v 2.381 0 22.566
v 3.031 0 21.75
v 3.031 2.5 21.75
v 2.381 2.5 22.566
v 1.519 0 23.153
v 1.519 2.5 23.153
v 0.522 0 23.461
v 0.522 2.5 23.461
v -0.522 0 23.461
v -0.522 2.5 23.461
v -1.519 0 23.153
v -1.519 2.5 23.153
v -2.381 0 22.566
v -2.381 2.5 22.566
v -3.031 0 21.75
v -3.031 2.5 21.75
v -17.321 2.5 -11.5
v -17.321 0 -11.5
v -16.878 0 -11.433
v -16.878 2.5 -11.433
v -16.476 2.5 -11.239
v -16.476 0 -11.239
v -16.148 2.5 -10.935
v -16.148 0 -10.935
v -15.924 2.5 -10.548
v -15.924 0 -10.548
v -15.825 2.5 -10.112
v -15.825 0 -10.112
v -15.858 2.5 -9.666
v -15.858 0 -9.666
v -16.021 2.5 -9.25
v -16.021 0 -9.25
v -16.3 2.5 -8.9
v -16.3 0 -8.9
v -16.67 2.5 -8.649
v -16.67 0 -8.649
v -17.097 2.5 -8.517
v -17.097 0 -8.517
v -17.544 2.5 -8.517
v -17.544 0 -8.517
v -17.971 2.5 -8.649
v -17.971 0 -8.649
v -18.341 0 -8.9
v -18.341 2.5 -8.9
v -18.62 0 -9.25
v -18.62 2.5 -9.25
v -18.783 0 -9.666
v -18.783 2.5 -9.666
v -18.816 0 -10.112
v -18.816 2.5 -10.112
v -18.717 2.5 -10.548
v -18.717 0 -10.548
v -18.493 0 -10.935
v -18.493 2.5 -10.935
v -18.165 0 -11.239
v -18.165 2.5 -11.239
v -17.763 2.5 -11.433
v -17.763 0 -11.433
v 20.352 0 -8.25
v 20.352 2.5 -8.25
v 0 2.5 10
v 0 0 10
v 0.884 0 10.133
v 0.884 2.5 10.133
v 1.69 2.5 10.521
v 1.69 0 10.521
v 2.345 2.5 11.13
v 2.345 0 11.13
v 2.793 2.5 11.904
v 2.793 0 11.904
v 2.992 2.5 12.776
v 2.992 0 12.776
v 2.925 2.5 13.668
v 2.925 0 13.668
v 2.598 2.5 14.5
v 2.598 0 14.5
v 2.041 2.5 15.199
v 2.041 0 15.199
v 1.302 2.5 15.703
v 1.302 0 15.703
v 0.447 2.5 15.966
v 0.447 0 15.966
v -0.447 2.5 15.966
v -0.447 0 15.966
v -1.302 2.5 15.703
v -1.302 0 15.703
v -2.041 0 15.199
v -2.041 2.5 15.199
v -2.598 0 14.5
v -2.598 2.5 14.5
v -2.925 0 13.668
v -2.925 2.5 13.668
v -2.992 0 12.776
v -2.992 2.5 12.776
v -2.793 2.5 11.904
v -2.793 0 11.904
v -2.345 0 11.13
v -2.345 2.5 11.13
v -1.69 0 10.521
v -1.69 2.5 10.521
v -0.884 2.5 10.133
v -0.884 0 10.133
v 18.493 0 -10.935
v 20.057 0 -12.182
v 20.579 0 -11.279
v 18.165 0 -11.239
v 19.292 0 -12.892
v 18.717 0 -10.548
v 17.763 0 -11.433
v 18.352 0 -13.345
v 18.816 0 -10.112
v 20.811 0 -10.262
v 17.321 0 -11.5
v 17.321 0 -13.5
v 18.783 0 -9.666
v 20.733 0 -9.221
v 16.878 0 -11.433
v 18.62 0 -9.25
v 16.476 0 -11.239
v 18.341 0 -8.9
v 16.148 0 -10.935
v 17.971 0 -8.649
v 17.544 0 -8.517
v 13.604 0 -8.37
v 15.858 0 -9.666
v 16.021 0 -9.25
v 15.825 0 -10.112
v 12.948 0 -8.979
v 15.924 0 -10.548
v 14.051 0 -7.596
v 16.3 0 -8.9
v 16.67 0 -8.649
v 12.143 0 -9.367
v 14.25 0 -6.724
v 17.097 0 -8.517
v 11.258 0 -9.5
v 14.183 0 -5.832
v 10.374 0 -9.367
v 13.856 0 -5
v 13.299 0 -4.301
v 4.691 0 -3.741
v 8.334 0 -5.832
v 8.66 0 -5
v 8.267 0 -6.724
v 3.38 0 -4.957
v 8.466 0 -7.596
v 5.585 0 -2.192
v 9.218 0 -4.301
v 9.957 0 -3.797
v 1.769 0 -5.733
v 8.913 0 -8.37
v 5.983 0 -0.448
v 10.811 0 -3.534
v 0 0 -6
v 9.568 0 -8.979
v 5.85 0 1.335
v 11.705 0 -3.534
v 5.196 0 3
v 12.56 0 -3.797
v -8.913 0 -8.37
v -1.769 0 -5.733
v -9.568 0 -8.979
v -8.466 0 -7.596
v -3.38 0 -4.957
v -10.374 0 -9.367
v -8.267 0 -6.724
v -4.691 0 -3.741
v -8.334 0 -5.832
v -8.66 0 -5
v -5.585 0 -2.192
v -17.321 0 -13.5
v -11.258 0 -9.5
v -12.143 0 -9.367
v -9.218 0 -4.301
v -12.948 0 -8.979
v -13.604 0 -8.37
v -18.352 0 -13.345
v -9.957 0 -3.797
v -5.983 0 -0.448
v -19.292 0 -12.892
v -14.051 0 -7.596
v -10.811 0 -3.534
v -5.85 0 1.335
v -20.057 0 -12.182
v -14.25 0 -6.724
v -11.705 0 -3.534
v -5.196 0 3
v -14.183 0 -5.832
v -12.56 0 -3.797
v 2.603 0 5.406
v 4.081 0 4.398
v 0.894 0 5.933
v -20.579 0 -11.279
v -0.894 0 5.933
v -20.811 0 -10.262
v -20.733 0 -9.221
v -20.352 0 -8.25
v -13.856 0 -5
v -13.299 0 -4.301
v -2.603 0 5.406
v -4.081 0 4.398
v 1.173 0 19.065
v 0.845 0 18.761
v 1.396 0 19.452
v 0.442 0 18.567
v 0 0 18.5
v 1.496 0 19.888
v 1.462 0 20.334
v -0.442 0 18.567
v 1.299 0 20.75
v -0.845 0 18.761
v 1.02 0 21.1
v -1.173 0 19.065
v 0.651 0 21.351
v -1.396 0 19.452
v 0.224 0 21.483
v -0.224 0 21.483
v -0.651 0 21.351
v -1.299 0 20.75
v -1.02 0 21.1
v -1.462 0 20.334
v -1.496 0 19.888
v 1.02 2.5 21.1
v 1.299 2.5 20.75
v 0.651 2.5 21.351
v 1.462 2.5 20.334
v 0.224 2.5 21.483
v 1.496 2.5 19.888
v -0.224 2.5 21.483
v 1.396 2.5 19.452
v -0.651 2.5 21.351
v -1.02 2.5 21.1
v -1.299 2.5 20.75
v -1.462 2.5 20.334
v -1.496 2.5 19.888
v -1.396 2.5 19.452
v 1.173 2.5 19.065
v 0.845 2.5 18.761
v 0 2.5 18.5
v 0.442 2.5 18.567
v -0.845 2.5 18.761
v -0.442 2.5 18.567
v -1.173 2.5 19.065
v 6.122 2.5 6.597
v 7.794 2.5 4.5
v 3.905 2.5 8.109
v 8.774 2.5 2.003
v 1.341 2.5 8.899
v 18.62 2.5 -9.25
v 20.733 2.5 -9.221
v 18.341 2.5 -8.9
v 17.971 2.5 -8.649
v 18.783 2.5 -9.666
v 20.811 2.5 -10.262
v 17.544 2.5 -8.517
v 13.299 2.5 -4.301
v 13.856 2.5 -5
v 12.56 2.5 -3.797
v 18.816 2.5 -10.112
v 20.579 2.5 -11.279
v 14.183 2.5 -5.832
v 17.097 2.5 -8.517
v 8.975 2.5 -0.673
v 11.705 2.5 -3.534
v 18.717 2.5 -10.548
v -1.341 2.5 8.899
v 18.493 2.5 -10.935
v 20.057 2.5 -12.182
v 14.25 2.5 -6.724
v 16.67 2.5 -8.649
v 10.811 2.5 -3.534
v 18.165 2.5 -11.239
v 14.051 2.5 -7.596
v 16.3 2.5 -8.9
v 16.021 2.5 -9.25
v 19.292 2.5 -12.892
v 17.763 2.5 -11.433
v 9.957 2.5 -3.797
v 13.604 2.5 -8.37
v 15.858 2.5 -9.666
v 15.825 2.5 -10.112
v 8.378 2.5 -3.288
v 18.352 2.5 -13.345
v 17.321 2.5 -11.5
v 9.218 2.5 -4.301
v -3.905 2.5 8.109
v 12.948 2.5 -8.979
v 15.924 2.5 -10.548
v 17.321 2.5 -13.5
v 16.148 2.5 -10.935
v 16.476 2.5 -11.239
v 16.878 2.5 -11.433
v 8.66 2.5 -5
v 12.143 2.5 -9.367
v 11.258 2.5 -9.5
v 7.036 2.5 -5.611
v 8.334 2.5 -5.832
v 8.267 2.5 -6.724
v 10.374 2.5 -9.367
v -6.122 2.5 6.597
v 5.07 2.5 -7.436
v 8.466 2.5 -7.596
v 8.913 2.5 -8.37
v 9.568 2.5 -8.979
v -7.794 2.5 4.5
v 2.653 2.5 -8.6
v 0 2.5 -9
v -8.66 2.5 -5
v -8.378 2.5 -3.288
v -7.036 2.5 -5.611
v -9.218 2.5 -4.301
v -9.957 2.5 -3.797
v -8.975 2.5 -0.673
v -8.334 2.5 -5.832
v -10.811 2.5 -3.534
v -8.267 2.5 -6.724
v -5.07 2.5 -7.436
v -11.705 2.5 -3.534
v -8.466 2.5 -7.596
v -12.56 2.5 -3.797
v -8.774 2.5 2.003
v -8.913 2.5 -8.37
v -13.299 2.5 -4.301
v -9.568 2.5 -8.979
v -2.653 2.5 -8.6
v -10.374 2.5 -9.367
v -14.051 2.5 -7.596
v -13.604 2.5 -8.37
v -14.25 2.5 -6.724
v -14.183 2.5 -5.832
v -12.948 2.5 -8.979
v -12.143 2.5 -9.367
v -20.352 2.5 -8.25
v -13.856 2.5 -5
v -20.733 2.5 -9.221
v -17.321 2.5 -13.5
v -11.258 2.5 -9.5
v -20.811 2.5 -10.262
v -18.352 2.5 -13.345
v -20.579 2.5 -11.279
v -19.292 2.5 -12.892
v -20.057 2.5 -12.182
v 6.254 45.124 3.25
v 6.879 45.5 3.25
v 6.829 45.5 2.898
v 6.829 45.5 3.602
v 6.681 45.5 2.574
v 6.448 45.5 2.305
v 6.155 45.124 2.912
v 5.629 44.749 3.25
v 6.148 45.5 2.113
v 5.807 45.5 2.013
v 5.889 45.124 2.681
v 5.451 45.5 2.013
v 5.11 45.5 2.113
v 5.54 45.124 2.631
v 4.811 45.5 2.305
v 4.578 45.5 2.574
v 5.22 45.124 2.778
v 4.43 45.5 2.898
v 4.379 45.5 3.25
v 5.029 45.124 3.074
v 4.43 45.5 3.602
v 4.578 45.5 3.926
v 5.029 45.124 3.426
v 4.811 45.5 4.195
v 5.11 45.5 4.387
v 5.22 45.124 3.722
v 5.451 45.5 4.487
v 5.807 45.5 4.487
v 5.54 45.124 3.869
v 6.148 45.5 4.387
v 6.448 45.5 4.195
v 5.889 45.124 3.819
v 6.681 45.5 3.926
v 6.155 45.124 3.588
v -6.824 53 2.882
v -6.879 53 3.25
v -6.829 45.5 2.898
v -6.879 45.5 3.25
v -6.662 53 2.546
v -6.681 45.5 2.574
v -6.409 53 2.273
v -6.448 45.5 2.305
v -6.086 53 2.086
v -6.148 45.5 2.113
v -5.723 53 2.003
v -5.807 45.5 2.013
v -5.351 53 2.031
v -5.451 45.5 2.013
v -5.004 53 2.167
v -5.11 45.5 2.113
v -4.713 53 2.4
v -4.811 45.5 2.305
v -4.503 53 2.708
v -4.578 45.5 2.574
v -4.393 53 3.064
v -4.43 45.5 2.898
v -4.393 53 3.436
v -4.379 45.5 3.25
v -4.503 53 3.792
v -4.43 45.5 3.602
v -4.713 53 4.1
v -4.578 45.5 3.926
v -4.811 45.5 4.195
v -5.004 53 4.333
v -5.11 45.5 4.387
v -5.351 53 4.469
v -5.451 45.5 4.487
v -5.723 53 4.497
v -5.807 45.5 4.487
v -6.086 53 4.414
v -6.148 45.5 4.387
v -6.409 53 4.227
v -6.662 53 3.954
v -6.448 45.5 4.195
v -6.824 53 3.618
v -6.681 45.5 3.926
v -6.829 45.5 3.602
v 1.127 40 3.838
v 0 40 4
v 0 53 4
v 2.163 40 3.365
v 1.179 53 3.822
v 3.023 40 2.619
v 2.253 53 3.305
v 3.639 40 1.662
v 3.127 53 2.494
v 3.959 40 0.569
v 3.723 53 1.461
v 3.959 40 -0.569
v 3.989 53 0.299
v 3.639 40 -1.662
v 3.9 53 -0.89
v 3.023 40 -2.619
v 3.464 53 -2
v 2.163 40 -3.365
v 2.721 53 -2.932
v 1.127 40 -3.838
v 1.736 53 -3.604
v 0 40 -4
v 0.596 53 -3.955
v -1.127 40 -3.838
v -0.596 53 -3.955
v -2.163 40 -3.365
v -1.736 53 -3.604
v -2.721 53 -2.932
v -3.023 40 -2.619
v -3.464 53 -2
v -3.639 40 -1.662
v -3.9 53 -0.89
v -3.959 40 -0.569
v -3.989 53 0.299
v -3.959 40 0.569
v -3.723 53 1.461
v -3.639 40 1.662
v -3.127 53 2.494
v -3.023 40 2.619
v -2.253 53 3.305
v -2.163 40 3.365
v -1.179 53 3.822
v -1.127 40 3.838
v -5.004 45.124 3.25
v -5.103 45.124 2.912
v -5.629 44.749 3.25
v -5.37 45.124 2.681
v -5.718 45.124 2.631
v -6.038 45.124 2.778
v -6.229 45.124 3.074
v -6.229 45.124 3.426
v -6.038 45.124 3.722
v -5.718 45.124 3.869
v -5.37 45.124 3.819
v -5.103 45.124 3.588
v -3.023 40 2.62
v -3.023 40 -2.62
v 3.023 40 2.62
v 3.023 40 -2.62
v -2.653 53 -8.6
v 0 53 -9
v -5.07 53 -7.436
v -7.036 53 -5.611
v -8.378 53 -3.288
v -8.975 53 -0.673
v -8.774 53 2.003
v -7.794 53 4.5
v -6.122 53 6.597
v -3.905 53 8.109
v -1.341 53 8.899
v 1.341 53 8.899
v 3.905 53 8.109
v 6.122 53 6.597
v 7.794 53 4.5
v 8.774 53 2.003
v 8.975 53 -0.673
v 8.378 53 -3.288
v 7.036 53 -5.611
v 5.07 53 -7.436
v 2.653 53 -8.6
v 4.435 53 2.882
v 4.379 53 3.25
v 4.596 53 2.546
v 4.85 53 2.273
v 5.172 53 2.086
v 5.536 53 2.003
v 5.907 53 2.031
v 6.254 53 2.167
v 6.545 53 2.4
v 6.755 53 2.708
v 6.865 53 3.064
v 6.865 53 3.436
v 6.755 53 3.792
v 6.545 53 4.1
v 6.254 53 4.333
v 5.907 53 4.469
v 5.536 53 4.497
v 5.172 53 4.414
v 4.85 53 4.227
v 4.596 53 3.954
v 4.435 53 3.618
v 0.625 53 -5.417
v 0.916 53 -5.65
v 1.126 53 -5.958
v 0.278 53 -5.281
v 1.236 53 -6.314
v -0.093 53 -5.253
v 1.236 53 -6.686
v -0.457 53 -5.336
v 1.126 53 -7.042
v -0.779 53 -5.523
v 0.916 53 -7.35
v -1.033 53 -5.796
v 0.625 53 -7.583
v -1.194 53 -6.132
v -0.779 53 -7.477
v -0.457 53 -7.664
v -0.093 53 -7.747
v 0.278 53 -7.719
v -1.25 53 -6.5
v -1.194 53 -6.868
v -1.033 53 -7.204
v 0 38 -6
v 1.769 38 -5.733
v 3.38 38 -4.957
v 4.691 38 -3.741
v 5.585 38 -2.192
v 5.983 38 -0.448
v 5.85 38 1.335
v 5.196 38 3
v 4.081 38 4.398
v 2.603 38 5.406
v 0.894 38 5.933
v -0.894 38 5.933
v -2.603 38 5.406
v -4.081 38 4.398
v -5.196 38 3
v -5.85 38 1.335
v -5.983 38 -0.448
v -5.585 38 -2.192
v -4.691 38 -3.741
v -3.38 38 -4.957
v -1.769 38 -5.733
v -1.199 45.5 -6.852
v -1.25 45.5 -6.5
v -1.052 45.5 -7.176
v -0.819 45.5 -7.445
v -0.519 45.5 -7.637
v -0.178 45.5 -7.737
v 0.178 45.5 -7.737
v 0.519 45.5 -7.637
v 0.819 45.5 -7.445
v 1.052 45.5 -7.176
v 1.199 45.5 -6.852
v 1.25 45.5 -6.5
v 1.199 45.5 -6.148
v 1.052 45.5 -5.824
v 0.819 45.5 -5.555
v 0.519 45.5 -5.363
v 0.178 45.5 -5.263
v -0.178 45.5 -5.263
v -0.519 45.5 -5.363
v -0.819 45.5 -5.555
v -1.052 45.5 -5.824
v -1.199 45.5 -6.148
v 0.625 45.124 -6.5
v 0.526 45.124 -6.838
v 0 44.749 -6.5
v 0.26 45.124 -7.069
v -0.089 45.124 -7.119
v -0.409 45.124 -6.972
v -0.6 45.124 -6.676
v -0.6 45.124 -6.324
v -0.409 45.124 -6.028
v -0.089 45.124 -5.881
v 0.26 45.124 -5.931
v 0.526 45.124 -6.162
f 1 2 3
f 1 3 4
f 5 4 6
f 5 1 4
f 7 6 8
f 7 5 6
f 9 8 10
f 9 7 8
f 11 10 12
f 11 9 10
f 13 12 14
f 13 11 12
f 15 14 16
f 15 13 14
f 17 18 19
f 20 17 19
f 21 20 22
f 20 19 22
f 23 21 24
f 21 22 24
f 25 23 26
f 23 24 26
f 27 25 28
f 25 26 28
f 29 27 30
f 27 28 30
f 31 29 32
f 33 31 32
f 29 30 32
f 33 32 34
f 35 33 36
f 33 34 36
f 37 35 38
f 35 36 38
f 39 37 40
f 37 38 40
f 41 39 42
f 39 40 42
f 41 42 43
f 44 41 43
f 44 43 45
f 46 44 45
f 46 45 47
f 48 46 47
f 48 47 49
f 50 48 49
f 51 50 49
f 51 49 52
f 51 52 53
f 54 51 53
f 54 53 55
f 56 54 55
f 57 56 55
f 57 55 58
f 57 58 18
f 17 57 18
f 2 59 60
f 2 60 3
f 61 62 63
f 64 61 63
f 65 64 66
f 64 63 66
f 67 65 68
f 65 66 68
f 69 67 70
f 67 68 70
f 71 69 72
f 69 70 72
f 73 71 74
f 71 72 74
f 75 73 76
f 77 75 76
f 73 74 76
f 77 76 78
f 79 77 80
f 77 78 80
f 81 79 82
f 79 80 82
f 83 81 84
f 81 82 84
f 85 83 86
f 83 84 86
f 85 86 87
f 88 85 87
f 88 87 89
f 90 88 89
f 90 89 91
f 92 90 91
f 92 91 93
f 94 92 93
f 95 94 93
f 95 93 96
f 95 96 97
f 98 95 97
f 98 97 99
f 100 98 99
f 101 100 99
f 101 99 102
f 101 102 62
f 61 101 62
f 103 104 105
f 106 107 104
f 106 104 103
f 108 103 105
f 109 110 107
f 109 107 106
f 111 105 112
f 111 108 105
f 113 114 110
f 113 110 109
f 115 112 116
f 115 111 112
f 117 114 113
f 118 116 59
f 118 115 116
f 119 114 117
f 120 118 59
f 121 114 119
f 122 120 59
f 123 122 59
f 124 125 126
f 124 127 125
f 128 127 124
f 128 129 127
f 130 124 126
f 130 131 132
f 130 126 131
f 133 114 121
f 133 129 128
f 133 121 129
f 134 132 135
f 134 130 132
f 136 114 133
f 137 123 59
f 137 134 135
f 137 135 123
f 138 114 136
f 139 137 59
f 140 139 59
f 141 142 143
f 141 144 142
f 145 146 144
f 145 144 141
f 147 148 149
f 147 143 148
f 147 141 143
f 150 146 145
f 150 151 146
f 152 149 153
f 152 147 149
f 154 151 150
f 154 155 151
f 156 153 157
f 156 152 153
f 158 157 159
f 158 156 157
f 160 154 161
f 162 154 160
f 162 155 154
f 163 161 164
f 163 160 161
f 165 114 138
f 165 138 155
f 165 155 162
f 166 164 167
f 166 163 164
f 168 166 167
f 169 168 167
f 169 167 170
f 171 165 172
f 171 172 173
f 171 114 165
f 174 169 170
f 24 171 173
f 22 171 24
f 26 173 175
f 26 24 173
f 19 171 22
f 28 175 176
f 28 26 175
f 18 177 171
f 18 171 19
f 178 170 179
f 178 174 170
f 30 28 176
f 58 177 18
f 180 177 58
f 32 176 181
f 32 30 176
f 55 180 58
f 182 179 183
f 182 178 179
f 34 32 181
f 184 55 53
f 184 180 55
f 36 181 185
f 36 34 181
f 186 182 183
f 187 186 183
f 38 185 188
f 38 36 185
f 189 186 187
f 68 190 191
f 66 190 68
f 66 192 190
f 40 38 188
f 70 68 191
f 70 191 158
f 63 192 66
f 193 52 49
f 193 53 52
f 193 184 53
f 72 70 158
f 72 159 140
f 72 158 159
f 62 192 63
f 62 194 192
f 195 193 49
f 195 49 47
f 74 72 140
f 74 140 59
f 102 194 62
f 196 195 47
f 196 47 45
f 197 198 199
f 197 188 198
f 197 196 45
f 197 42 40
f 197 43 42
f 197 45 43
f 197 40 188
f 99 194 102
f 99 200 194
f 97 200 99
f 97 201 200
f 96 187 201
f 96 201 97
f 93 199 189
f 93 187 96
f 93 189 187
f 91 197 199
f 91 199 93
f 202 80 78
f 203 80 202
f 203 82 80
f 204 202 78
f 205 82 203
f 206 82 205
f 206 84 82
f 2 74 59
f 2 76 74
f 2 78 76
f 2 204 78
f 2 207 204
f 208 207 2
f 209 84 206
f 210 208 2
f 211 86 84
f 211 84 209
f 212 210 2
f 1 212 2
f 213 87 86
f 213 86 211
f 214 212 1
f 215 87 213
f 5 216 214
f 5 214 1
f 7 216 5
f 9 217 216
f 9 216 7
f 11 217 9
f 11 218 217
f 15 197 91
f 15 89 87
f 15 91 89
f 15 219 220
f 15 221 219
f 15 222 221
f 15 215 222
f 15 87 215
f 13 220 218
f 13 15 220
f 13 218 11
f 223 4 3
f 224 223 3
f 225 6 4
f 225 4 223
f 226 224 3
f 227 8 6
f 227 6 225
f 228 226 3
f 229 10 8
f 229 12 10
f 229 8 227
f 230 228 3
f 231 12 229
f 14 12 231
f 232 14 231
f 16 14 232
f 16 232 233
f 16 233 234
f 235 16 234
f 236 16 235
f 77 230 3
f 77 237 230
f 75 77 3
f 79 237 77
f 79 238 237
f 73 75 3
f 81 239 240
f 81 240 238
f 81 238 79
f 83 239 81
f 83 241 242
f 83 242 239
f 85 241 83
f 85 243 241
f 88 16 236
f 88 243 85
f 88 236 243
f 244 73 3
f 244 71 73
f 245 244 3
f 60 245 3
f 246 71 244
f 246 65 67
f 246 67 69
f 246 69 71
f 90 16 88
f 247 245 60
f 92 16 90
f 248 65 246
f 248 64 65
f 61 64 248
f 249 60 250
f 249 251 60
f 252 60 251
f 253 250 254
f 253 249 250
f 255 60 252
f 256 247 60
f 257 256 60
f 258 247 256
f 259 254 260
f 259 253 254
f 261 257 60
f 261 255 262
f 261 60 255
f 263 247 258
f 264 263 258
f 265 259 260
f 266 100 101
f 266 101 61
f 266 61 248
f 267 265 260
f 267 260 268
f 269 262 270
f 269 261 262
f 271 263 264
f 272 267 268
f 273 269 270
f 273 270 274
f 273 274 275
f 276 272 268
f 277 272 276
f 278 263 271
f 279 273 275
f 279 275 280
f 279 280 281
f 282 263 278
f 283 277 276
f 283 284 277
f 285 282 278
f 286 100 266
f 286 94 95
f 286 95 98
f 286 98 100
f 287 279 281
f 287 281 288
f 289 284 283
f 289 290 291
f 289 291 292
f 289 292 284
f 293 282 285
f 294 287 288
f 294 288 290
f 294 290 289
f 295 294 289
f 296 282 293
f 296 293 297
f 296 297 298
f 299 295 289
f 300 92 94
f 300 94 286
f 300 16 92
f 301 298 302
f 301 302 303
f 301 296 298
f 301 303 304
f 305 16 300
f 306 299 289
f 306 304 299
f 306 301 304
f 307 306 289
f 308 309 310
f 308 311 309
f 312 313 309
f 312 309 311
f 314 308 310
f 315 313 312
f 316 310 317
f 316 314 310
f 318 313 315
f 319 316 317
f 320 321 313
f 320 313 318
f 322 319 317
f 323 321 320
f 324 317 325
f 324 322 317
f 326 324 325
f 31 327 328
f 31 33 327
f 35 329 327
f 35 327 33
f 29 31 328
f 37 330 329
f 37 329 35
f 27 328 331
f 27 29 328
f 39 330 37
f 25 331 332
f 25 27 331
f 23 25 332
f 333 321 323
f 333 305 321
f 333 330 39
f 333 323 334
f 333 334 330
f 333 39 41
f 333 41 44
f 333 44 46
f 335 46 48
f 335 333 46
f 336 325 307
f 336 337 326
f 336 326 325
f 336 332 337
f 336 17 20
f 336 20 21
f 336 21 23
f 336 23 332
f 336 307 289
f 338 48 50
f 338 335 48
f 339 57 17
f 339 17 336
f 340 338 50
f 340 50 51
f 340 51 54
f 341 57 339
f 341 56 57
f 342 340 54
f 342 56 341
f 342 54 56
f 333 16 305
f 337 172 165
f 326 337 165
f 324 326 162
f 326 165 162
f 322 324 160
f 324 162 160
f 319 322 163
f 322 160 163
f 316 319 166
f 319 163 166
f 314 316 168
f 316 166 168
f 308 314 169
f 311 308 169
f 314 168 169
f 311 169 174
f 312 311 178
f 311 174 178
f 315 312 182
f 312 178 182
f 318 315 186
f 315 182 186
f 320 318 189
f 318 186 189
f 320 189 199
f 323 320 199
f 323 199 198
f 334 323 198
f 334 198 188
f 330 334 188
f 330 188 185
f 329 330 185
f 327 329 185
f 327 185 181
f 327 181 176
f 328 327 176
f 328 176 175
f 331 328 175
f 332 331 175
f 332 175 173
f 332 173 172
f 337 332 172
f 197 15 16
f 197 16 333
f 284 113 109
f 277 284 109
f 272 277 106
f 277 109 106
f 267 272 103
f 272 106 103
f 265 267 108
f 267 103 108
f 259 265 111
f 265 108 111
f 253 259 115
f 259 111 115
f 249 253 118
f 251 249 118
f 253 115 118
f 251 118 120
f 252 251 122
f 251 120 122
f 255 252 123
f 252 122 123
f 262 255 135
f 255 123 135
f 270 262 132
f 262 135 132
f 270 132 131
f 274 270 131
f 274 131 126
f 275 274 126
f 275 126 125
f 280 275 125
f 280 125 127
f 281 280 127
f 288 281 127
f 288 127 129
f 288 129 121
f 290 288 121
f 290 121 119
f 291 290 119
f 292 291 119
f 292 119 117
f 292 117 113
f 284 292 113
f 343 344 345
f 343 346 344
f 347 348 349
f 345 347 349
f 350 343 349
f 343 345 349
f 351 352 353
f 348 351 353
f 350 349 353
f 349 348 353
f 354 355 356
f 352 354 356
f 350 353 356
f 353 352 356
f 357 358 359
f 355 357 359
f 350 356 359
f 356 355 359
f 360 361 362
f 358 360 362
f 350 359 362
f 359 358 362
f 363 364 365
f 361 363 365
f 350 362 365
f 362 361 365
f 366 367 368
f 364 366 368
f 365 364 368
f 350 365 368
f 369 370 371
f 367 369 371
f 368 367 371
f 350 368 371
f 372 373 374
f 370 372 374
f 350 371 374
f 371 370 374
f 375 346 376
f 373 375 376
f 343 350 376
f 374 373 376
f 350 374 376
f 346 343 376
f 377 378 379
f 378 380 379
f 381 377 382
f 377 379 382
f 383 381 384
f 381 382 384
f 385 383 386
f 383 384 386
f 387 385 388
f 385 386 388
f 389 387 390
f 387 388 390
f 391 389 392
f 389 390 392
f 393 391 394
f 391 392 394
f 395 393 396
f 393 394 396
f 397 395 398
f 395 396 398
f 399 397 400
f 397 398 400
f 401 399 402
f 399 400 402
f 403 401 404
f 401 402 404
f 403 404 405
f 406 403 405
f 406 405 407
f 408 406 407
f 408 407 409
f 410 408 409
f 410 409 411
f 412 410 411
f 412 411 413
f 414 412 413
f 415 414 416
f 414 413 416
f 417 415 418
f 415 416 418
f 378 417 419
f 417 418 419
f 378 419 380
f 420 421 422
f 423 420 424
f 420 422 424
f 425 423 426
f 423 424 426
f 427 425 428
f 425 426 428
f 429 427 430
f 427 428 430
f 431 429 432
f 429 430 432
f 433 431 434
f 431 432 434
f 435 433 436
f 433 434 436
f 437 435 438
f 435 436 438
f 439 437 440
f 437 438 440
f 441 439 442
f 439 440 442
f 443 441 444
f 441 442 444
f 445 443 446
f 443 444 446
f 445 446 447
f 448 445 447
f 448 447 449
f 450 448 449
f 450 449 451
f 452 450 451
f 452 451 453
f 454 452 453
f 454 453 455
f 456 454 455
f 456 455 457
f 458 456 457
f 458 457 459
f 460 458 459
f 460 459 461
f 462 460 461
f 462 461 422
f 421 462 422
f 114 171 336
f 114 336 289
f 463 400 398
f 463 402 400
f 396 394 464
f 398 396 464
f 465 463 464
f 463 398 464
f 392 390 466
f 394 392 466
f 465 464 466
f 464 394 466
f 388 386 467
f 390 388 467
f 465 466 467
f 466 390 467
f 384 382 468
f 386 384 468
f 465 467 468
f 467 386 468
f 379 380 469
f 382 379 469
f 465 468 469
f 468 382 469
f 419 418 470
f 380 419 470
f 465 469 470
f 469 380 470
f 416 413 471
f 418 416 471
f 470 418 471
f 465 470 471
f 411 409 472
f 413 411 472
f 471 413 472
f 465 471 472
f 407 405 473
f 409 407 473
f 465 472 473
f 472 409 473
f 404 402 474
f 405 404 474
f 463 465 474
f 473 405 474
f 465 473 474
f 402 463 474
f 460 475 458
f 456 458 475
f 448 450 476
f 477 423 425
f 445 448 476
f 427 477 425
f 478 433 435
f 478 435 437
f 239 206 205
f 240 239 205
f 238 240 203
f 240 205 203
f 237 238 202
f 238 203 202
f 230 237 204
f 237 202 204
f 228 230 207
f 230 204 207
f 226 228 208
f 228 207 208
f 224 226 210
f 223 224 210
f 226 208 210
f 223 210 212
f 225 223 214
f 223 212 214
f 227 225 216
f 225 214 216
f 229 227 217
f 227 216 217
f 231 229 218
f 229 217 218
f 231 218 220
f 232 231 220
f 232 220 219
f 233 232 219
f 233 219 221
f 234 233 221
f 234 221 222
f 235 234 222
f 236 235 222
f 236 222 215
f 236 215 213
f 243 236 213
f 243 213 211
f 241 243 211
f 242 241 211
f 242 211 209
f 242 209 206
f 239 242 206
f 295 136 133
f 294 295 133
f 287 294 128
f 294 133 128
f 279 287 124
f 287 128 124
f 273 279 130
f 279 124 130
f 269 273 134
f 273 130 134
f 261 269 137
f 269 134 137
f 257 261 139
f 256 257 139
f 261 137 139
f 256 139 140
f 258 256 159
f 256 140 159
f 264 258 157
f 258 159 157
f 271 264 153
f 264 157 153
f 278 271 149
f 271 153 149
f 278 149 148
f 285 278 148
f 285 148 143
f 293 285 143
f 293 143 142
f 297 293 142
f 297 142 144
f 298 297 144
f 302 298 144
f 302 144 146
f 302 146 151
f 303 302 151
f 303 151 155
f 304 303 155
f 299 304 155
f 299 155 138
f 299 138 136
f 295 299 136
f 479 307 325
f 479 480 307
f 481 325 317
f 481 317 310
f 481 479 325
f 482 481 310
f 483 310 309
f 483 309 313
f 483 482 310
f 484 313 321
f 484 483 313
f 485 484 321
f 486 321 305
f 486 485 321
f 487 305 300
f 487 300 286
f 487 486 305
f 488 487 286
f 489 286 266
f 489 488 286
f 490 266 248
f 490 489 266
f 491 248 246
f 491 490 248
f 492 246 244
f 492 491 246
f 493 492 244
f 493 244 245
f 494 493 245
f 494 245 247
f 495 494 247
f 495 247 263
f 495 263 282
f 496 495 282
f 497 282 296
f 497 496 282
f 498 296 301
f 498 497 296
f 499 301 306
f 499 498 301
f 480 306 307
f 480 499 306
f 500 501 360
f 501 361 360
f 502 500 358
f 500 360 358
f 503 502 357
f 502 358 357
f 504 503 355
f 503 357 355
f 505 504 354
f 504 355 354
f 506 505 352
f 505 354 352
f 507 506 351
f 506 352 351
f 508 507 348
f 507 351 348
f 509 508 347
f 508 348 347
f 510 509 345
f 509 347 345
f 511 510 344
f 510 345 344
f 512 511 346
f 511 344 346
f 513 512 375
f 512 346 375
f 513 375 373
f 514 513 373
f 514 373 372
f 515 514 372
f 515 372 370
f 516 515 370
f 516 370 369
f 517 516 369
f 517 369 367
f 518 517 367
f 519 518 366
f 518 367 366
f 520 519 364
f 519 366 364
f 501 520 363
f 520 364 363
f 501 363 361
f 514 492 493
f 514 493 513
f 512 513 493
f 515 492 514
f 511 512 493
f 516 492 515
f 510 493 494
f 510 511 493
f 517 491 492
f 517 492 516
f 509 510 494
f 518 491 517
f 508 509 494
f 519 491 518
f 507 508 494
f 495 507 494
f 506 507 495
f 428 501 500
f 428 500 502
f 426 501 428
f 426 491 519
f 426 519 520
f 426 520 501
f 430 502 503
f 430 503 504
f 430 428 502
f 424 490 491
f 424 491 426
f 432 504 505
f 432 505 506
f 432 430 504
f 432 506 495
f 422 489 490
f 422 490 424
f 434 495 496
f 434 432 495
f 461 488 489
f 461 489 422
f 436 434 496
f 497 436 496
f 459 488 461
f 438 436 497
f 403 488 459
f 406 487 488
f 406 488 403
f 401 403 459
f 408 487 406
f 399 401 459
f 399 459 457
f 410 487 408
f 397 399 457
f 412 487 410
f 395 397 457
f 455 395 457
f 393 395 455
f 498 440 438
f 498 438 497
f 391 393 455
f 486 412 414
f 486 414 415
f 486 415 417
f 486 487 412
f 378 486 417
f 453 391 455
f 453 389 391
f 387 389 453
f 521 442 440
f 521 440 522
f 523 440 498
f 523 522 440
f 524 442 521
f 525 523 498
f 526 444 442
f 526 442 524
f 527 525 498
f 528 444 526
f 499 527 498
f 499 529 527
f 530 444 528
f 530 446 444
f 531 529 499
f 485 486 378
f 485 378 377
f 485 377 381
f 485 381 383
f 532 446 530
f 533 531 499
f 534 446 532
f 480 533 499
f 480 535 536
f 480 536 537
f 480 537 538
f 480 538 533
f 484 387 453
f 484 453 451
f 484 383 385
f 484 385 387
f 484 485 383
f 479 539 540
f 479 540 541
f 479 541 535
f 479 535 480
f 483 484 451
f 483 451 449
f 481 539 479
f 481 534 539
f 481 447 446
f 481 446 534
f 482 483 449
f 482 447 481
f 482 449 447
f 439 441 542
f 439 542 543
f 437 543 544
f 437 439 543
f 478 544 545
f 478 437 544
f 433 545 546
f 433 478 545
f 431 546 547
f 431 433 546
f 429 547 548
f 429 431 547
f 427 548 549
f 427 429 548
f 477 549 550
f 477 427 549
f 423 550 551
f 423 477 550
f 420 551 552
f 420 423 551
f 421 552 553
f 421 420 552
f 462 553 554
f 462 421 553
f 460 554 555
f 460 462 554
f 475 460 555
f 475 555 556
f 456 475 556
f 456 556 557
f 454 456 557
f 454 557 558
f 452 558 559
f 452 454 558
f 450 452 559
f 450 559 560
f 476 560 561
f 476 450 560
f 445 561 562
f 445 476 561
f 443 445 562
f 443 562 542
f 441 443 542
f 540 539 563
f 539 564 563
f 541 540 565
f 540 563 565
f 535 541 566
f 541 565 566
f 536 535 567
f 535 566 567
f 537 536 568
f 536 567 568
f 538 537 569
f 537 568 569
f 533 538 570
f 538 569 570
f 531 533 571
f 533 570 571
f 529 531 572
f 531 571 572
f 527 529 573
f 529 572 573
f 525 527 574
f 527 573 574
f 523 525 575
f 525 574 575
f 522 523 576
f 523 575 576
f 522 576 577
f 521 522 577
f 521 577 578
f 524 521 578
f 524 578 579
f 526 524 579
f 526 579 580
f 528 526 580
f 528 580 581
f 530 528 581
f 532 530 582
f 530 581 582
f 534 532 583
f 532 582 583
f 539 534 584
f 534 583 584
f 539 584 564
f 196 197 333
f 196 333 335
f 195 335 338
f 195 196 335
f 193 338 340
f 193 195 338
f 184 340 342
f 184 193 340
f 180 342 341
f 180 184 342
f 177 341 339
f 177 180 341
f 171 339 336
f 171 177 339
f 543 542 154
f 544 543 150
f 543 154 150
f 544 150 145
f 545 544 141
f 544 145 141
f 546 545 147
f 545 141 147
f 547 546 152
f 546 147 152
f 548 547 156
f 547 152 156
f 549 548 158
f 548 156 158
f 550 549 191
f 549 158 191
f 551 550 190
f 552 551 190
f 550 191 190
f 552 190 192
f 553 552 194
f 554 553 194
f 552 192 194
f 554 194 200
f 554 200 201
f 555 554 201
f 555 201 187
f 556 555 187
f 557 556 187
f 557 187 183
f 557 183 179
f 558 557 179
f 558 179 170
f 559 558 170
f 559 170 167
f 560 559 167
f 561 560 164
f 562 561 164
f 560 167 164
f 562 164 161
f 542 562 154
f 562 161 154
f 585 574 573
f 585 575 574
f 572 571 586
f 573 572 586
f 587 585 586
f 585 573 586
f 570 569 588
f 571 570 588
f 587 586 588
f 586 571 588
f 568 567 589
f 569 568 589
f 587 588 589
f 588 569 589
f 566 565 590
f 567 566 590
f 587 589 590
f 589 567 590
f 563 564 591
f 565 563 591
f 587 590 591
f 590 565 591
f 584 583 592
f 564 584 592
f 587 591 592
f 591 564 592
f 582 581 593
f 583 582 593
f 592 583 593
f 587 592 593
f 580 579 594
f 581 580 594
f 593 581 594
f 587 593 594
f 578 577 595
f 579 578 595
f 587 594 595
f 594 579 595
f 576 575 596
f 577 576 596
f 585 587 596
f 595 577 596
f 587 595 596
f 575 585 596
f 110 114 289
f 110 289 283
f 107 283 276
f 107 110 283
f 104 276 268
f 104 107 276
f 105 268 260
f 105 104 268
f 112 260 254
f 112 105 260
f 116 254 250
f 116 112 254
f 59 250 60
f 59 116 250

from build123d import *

# Parameters (mm, degrees)
SKETCH_9_OUTSIDE_W     = 66.002
SKETCH_9_OUTSIDE_H     = 66.002
SKETCH_9_OUTSIDE_R     = 1.5
SKETCH_9_OUTSIDE_R_2   = 3
CUT_EXTRUDE_2_DEPTH    = 63.557973113
HOLE_WIZARD_M3_1_D     = 2.5
HOLE_WIZARD_M3_1_DEPTH = 7.5
HOLE_WIZARD_M3_1_TIP   = 0.751075774
SKETCH_10_R            = 4
CUT_EXTRUDE_3_DEPTH    = 62.601489889
SKETCH_15_R            = 6
CUT_EXTRUDE_4_DEPTH    = 40
CHAMFER_1_SIZE         = 2


with BuildPart() as part:
    # 草图2 → 旋转1 (revolve)
    with BuildSketch(Plane.XY, mode=Mode.PRIVATE) as revolve_1_sk:
        Polygon((0, 0), (23.5, 0), (23.5, 2.5), (9, 2.5), (9, 53), (0, 53), align=None)
    revolve(revolve_1_sk.sketch.rotate(Axis((0, 0, 0), (0, 1, 0)), 90), axis=Axis((0, 0, 0), (0, 1, 0)))

    # 草图9 outside → 切除-拉伸2 (cut, through all)
    # profile 1 of 7: a face of its own
    with BuildSketch(Plane.XZ):
        Rectangle(SKETCH_9_OUTSIDE_W, SKETCH_9_OUTSIDE_H)
        with BuildLine():
            Line((-3.031088913, 21.75), (-20.351596989, -8.25))
            ThreePointArc((-20.351596989, -8.25), (-20.351596989, -11.75), (-17.320508076, -13.5))
            Line((-17.320508076, -13.5), (17.320508076, -13.5))
            ThreePointArc((17.320508076, -13.5), (20.351596989, -11.75), (20.351596989, -8.25))
            Line((20.351596989, -8.25), (3.031088913, 21.75))
            ThreePointArc((3.031088913, 21.75), (0, 23.5), (-3.031088913, 21.75))
        make_face(mode=Mode.SUBTRACT)
    # profile 2 of 7: a face of its own
    with BuildSketch(Plane.XZ):
        with Locations(Location((0, 20, 0), (0, 0, 270))):
            Circle(SKETCH_9_OUTSIDE_R)
    # profile 3 of 7: a face of its own
    with BuildSketch(Plane.XZ):
        with Locations(Location((17.320508076, -10, 0), (0, 0, 270))):
            Circle(SKETCH_9_OUTSIDE_R)
    # profile 4 of 7: a face of its own
    with BuildSketch(Plane.XZ):
        with Locations(Location((-17.320508076, -10, 0), (0, 0, 270))):
            Circle(SKETCH_9_OUTSIDE_R)
    # profile 5 of 7: a face of its own
    with BuildSketch(Plane.XZ):
        with Locations(Location((0, 13, 0), (0, 0, 270))):
            Circle(SKETCH_9_OUTSIDE_R_2)
    # profile 6 of 7: a face of its own
    with BuildSketch(Plane.XZ):
        with Locations(Location((11.258330249, -6.5, 0), (0, 0, 270))):
            Circle(SKETCH_9_OUTSIDE_R_2)
    # profile 7 of 7: a face of its own
    with BuildSketch(Plane.XZ):
        with Locations(Location((-11.258330249, -6.5, 0), (0, 0, 270))):
            Circle(SKETCH_9_OUTSIDE_R_2)
    extrude(amount=-CUT_EXTRUDE_2_DEPTH, mode=Mode.SUBTRACT)

    # M3 螺纹孔1
    with Locations(Plane(origin=(0, 53, 0), x_dir=(1, 0, 0), z_dir=(0, 1, 0))):
        with Locations((-5.629165125, -3.25), (0, 6.5), (5.629165125, -3.25)):
            Hole(HOLE_WIZARD_M3_1_D / 2, depth=HOLE_WIZARD_M3_1_DEPTH)
            with Locations((0, 0, -(HOLE_WIZARD_M3_1_DEPTH + HOLE_WIZARD_M3_1_TIP / 2))):  # 118° drill point
                Cone(0, HOLE_WIZARD_M3_1_D / 2, HOLE_WIZARD_M3_1_TIP, mode=Mode.SUBTRACT)

    # 草图10 → 切除-拉伸3 (cut, through all)
    with BuildSketch(Plane(origin=(0, 53, 0), x_dir=(1, 0, 0), z_dir=(0, 1, 0))):
        with Locations(Location((0, 0, 0), (0, 0, 270))):
            Circle(SKETCH_10_R)
    extrude(amount=-CUT_EXTRUDE_3_DEPTH, mode=Mode.SUBTRACT)

    # 草图15 → 切除-拉伸4 (cut)
    with BuildSketch(Plane.XZ):
        with Locations(Location((0, 0, 0), (0, 0, 270))):
            Circle(SKETCH_15_R)
    extrude(amount=-CUT_EXTRUDE_4_DEPTH, mode=Mode.SUBTRACT)

    # 倒角1
    chamfer_1_edges = [part.edges().sort_by_distance(p)[0] for p in [
        (0, 40, 6),
    ]]
    chamfer(chamfer_1_edges, length=CHAMFER_1_SIZE - 0.0001)  # a hair under: the kernel refuses the full size


solid = part.part
